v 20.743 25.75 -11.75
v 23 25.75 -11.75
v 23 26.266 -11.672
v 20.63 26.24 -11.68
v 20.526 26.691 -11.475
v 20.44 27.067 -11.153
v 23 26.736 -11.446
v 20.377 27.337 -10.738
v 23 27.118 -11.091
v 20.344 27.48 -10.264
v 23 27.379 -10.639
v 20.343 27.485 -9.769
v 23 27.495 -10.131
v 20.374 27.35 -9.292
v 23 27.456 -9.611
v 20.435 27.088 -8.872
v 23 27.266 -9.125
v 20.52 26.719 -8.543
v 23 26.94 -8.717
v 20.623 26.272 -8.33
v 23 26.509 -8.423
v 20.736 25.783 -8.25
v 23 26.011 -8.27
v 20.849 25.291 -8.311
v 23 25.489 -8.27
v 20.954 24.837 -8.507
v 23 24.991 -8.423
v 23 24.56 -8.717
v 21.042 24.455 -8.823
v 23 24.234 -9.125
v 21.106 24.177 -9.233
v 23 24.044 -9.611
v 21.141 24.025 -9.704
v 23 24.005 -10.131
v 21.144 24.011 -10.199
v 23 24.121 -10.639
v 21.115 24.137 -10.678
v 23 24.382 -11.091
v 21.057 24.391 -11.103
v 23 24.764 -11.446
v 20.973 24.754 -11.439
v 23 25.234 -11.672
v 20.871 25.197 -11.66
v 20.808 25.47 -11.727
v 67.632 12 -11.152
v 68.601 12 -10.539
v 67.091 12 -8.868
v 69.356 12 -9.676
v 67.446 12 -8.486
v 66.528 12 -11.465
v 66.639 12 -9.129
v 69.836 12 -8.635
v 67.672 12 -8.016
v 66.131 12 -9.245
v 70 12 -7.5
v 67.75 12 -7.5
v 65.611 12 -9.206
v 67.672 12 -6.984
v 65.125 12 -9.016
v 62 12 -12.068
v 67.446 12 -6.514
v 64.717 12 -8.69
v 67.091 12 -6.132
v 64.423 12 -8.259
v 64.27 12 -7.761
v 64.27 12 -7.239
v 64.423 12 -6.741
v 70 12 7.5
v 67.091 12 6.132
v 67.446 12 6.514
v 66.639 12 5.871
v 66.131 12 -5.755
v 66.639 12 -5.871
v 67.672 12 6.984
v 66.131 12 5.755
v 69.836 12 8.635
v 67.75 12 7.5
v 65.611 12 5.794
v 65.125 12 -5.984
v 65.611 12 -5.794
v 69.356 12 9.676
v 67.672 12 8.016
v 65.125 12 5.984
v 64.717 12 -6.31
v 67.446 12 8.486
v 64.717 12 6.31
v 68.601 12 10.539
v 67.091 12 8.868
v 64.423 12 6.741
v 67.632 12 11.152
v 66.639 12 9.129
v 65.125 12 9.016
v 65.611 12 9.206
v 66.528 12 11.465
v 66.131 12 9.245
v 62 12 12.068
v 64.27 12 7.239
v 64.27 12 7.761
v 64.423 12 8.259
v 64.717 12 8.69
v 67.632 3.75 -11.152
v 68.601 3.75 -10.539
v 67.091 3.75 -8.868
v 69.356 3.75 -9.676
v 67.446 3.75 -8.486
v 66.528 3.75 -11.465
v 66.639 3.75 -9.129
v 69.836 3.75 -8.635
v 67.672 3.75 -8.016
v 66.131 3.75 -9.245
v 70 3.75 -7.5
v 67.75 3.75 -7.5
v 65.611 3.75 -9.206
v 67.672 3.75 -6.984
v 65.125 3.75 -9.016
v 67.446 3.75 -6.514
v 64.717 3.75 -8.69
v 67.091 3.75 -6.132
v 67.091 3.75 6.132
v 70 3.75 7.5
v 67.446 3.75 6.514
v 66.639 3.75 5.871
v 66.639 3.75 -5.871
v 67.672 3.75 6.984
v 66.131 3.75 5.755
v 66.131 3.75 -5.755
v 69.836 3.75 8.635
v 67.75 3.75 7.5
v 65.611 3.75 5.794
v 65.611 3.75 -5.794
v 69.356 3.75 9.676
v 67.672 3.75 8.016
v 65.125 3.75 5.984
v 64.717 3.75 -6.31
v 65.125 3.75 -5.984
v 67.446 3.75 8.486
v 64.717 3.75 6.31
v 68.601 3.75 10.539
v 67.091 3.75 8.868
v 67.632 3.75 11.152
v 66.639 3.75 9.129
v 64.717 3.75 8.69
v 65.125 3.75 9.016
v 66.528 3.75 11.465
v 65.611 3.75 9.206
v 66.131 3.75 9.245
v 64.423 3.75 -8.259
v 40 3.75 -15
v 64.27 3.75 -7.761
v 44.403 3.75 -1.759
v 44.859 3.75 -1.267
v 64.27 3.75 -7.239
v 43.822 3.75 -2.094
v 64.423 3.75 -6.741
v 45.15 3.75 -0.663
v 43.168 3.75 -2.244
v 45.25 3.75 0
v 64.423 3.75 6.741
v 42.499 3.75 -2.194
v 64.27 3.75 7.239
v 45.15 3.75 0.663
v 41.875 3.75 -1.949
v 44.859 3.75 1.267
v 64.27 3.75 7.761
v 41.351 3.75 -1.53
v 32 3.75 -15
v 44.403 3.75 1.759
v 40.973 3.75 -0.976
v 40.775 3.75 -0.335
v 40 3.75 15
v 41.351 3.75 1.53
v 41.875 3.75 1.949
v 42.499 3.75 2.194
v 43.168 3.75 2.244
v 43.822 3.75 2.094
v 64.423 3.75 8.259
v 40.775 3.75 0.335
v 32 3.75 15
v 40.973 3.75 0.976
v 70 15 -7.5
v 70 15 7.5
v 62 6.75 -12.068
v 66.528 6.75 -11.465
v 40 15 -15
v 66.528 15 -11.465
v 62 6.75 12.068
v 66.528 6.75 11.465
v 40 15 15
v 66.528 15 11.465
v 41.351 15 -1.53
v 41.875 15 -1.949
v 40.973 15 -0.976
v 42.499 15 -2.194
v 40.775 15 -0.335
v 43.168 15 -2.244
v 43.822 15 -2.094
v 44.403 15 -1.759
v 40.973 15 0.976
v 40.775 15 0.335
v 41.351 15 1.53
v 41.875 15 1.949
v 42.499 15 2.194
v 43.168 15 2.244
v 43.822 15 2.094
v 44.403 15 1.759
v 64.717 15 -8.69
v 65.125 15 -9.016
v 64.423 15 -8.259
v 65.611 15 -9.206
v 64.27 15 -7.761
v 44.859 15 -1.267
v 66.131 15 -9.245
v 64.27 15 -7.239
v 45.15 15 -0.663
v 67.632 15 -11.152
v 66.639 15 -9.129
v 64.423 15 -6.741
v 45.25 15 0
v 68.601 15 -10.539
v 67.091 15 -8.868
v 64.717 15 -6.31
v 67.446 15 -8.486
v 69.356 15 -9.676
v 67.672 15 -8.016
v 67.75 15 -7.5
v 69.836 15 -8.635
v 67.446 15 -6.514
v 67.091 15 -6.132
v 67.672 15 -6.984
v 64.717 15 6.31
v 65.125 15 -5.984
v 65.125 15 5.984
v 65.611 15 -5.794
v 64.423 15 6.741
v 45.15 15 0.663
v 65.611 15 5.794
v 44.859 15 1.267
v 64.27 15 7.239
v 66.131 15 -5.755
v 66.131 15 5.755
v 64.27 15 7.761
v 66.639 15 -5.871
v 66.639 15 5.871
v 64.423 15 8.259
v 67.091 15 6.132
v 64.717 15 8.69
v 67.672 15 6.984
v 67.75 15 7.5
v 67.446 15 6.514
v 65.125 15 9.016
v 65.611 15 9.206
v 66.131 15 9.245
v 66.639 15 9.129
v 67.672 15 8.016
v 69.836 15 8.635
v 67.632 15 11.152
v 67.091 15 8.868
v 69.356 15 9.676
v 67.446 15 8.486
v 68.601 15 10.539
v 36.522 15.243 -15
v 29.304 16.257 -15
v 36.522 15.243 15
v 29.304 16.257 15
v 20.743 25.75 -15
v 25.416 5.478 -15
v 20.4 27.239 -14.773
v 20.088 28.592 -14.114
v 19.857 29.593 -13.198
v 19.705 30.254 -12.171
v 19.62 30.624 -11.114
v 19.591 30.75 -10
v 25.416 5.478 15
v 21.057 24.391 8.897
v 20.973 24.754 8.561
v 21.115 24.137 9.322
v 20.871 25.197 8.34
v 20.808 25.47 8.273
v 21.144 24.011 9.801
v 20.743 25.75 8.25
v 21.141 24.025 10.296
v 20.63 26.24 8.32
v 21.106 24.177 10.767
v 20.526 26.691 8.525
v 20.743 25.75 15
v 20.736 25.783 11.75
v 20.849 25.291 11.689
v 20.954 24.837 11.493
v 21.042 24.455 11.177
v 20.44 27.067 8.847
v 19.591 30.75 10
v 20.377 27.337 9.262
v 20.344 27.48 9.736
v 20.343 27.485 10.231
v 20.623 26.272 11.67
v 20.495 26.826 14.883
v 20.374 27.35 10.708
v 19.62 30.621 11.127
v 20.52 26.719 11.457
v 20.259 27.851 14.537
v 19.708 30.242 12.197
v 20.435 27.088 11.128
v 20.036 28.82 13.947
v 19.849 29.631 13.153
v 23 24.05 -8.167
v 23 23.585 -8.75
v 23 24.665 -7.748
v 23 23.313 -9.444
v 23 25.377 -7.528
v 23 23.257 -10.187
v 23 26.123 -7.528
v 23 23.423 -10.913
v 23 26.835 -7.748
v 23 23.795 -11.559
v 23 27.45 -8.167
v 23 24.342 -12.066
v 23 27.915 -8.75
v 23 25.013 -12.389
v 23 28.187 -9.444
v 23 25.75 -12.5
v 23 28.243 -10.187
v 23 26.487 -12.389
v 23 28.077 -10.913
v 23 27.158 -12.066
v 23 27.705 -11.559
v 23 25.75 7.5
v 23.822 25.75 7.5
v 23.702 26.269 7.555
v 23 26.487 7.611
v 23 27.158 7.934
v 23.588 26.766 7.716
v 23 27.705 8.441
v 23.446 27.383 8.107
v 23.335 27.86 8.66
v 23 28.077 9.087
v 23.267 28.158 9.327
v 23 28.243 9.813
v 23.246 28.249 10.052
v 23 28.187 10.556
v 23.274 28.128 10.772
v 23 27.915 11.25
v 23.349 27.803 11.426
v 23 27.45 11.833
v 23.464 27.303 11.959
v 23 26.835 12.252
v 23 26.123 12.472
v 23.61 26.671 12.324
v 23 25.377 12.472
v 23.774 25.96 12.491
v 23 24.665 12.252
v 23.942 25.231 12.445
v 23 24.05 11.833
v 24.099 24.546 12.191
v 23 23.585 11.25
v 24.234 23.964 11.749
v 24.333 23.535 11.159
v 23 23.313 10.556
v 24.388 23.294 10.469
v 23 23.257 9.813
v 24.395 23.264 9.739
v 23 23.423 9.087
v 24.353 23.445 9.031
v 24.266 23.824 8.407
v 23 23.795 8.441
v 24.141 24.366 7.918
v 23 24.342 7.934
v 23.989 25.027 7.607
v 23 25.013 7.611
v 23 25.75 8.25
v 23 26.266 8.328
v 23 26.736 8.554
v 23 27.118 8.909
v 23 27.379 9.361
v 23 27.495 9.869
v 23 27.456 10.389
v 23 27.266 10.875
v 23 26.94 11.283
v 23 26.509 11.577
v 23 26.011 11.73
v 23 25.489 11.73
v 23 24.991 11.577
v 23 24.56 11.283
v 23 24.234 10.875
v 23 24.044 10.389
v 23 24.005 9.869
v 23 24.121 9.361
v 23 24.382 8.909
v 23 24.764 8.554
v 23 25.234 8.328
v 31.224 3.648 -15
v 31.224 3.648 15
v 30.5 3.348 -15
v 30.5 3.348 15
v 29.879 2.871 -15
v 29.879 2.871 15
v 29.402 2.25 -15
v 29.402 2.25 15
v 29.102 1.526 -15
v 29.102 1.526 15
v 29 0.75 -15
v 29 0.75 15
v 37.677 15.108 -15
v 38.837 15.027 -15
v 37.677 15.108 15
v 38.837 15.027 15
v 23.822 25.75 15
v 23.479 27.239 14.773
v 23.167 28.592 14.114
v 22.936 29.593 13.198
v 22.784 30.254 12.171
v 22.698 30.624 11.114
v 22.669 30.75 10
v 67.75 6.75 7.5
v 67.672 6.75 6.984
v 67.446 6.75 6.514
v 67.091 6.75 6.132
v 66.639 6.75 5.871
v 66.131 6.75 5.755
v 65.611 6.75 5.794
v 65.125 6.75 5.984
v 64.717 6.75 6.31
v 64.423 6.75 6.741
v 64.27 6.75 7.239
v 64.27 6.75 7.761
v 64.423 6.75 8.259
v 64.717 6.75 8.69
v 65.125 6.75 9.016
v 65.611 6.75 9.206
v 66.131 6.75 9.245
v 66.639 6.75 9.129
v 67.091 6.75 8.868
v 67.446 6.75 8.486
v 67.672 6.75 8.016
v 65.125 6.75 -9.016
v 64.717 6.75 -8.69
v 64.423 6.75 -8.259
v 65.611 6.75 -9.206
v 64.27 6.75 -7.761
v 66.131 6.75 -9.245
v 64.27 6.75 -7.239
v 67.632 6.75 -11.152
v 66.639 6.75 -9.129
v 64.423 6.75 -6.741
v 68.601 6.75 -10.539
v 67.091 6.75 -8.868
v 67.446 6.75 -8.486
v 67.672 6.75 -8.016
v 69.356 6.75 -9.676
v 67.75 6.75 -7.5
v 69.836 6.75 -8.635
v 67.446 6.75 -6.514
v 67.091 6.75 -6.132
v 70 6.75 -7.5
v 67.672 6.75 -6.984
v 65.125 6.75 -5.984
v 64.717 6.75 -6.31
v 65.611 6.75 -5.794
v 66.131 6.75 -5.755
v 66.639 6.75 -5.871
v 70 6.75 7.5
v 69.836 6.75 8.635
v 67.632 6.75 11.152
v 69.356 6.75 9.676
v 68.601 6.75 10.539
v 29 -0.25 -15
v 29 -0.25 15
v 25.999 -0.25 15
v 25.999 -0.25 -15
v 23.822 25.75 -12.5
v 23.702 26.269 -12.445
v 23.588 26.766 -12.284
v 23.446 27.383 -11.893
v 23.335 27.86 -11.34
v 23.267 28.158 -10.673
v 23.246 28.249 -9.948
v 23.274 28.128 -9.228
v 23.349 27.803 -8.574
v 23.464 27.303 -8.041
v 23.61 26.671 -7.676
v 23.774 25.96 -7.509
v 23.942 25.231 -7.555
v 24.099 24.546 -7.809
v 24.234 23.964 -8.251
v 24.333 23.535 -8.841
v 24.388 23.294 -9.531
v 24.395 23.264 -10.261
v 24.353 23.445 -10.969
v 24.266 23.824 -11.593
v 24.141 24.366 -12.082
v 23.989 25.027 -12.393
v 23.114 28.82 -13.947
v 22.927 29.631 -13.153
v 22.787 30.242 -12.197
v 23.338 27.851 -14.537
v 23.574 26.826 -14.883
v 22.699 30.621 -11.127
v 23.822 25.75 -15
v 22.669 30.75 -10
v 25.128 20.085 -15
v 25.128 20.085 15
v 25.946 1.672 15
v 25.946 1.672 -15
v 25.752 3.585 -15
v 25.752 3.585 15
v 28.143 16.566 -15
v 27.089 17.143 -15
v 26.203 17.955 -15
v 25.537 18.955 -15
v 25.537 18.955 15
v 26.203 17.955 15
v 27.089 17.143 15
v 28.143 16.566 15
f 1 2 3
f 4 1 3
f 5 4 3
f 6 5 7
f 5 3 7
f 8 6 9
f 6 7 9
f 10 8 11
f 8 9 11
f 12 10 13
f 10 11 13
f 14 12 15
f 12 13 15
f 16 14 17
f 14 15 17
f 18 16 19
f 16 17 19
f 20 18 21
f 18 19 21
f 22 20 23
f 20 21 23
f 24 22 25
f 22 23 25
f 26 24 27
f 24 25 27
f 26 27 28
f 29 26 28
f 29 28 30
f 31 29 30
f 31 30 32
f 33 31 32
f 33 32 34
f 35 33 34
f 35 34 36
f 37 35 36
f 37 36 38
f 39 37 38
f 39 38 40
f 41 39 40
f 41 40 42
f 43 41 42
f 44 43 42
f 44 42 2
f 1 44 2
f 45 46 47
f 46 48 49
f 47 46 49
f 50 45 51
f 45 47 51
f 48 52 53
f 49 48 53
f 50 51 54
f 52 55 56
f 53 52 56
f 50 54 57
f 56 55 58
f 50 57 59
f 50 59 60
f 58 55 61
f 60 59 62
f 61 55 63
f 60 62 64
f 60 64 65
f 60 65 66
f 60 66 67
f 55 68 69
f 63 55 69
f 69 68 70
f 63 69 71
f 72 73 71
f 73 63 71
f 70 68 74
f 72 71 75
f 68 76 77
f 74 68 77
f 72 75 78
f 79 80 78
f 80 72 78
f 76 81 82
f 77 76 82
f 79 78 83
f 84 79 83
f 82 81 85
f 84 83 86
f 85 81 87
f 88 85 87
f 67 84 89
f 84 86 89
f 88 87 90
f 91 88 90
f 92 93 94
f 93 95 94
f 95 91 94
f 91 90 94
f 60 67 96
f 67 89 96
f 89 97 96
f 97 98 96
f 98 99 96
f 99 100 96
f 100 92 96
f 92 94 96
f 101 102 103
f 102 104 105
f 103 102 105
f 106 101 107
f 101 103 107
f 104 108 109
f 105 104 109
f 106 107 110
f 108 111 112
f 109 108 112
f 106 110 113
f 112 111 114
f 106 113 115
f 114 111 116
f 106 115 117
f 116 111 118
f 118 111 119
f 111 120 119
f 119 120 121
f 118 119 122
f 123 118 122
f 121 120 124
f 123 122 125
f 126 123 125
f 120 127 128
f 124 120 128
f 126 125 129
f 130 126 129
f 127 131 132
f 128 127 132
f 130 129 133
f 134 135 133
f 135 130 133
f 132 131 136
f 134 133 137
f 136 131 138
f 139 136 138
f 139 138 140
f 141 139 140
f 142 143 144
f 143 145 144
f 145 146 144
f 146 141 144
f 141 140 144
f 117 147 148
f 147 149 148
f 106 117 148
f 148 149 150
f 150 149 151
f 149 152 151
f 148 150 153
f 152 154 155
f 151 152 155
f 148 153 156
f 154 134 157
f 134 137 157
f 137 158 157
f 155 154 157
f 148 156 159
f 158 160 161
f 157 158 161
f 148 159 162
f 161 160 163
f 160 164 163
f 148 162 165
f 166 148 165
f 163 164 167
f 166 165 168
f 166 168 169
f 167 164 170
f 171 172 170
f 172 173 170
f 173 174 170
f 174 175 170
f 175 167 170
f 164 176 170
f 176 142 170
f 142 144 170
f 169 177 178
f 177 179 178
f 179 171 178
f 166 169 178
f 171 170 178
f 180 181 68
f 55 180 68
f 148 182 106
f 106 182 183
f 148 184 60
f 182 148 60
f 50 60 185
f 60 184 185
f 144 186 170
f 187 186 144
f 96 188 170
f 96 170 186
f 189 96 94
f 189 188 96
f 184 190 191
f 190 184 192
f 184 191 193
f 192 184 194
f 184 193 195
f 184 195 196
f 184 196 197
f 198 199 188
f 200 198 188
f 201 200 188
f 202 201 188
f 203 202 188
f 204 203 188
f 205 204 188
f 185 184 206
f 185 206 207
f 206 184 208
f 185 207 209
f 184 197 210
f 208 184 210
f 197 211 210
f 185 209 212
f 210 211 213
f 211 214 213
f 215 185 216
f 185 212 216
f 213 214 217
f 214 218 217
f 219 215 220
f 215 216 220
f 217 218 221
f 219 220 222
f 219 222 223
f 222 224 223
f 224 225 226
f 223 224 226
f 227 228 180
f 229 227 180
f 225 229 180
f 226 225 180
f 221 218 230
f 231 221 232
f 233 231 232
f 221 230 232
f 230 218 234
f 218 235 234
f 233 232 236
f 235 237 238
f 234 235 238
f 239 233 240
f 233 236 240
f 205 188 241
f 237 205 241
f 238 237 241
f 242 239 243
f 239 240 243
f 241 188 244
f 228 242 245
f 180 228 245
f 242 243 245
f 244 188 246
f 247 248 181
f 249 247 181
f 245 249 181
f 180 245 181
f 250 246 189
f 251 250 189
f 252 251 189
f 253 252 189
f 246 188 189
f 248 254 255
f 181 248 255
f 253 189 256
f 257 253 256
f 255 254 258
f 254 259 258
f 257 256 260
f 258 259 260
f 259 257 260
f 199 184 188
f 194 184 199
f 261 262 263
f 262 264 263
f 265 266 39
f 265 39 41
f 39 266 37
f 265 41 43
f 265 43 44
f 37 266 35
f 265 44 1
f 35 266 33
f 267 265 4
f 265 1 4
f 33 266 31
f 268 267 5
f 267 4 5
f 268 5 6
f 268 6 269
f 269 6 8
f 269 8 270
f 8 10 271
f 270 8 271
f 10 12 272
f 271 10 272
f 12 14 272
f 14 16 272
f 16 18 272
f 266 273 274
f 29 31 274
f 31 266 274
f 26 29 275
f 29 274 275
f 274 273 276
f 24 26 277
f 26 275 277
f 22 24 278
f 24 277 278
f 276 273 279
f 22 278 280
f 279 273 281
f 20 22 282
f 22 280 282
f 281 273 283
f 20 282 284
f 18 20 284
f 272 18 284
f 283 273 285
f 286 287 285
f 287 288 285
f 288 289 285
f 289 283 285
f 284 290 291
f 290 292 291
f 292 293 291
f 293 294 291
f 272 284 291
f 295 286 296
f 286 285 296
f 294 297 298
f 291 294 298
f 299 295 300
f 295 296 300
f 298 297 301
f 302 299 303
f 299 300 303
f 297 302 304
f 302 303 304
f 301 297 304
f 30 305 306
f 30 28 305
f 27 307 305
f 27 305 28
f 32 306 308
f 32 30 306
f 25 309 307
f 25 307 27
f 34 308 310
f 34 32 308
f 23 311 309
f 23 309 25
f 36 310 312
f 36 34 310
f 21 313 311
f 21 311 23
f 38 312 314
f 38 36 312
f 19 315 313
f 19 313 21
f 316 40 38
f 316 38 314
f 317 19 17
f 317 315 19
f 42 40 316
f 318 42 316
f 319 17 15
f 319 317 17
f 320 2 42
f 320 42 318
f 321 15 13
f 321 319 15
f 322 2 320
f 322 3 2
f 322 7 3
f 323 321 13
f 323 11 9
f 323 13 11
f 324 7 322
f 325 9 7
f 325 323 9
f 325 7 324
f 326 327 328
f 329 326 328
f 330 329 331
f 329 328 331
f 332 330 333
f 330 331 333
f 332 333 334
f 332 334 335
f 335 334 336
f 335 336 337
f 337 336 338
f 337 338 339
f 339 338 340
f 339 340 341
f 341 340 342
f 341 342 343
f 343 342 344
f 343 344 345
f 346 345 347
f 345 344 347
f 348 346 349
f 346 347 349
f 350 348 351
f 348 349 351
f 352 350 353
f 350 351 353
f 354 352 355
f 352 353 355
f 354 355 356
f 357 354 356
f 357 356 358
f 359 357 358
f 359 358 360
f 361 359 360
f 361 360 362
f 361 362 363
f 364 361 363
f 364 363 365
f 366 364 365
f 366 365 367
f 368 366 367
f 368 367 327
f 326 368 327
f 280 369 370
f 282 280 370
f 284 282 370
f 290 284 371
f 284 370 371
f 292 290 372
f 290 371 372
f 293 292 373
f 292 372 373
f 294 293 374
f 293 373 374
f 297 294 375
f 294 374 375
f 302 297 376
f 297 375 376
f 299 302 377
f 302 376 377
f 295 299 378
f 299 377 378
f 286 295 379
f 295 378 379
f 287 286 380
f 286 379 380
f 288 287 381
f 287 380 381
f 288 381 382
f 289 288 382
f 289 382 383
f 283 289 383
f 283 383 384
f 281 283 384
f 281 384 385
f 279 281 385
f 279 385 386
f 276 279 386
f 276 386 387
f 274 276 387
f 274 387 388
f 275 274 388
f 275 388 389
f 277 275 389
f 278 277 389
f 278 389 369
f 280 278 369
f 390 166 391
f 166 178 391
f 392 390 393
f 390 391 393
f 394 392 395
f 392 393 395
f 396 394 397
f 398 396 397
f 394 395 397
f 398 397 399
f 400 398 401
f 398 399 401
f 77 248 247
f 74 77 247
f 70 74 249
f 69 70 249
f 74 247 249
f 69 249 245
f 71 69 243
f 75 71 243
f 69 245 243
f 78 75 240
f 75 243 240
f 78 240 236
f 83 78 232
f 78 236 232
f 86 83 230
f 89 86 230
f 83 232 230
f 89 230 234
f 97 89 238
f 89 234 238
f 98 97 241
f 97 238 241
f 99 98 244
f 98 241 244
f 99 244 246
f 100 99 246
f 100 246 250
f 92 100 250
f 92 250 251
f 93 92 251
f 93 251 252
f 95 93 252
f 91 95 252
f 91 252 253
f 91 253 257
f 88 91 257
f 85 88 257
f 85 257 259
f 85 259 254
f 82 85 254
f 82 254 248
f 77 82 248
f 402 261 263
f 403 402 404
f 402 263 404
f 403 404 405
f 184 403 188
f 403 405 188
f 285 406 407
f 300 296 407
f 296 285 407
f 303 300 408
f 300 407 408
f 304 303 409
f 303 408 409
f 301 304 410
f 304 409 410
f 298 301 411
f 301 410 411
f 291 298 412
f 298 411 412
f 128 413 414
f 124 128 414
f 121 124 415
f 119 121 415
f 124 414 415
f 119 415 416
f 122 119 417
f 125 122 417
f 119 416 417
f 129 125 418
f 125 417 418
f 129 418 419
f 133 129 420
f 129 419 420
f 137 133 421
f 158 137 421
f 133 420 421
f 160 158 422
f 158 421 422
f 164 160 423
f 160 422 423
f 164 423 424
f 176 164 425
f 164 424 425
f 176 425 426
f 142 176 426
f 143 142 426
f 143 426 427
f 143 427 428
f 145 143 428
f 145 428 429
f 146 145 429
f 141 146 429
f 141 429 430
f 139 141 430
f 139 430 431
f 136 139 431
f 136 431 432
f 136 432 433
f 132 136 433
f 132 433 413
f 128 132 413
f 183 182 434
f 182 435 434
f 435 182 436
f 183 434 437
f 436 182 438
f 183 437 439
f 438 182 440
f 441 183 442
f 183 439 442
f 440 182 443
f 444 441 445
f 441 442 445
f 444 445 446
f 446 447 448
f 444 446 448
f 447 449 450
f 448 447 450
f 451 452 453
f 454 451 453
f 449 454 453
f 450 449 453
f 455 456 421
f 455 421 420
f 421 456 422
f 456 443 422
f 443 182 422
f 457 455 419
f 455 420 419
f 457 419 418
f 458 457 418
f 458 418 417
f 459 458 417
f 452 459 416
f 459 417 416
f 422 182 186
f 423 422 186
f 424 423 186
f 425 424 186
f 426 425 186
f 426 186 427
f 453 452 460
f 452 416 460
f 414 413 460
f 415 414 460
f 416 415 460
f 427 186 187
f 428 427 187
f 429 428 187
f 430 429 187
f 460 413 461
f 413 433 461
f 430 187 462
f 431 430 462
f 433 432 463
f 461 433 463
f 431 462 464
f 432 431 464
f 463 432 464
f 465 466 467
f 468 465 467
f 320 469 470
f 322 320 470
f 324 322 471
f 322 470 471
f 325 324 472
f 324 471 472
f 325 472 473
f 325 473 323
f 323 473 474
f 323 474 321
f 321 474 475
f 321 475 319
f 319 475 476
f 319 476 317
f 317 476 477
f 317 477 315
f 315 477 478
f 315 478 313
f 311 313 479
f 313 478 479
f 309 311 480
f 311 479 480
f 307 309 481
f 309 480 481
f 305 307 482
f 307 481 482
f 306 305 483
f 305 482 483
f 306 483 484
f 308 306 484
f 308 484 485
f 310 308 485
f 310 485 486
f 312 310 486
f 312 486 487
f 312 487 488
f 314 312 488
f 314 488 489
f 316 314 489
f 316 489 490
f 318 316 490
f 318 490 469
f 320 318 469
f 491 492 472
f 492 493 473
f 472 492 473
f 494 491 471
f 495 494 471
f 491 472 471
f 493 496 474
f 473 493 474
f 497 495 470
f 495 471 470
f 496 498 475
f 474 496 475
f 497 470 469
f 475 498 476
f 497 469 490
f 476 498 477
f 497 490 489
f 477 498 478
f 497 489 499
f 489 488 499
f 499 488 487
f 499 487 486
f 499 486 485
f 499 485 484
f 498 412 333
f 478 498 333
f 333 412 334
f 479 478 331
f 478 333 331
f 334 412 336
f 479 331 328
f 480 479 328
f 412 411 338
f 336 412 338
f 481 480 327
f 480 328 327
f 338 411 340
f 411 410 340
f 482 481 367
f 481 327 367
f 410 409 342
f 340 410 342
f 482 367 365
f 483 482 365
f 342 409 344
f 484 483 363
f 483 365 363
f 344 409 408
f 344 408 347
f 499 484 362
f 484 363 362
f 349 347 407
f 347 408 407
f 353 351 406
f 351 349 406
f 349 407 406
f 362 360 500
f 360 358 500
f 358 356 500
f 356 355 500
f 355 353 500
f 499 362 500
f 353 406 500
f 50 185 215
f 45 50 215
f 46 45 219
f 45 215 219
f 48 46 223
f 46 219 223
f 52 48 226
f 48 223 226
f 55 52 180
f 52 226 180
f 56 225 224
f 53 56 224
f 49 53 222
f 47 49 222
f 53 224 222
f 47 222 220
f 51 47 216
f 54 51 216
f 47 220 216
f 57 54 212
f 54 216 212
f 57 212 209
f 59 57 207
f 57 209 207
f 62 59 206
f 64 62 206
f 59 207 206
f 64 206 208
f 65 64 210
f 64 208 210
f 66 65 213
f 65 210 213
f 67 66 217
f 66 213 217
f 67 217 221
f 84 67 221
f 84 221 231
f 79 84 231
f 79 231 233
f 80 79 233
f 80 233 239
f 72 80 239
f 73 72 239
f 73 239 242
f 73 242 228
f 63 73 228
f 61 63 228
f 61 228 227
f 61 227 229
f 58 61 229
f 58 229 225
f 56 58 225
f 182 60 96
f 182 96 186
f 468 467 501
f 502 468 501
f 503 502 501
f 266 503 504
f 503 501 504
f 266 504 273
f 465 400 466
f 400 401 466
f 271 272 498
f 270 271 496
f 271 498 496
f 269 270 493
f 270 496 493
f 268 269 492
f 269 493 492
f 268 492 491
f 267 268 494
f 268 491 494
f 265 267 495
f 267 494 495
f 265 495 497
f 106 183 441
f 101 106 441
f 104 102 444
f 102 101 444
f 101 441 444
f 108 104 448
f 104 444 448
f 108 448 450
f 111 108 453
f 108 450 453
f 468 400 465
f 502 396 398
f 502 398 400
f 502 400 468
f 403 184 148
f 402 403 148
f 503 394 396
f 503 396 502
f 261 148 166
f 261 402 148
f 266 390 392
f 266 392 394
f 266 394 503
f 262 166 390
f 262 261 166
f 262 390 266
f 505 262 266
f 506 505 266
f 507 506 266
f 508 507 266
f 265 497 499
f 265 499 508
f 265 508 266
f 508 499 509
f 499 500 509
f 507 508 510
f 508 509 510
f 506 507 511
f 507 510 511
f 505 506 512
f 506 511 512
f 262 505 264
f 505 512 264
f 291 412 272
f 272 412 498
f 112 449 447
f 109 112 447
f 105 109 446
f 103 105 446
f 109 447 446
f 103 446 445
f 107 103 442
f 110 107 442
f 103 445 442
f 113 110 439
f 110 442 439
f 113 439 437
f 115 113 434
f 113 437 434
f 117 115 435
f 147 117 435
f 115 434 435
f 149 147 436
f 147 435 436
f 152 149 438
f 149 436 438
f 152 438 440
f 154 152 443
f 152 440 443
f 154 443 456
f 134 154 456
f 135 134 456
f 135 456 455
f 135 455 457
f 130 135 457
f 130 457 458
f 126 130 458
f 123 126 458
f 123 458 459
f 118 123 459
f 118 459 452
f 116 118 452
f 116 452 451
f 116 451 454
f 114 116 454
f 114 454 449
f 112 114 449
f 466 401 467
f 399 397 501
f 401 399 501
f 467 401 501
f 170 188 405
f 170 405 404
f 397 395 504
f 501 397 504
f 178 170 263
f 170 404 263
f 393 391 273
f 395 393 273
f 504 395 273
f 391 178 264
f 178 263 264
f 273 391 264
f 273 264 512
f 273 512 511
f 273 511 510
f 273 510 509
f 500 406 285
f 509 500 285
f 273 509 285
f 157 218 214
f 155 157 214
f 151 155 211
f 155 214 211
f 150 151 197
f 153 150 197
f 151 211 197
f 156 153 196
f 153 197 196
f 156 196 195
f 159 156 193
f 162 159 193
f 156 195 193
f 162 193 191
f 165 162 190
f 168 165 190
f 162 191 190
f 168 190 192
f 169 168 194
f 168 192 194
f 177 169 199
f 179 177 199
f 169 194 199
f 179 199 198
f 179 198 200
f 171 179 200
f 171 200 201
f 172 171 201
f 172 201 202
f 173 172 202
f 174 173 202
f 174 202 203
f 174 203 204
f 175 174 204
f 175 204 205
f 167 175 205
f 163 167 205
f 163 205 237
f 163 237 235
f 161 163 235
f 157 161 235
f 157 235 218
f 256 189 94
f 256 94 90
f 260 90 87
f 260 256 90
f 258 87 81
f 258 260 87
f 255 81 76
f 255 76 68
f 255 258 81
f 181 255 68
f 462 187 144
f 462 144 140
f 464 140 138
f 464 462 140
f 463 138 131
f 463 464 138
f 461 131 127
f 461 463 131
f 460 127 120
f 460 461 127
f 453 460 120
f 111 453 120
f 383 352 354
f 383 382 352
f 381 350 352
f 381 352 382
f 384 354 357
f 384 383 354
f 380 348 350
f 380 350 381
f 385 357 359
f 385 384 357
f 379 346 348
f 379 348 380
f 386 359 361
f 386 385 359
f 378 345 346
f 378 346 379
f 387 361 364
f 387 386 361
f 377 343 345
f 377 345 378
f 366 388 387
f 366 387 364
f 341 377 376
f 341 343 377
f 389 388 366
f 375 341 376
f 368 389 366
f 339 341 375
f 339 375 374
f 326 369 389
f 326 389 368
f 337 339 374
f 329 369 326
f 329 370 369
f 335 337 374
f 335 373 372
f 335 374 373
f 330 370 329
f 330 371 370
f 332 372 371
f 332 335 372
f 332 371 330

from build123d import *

# Parameters (mm, degrees)
BOSS_EXTRUDE1_DEPTH = 15
SKETCH2_R           = 1.75
SKETCH2_R_2         = 2.25
CUT_EXTRUDE1_DEPTH  = 16.25
SKETCH6_R           = 1.75
CUT_EXTRUDE4_DEPTH  = 51.639881715
SKETCH8_R           = 2.5
CUT_EXTRUDE5_DEPTH  = 2


with BuildPart() as part:
    # Sketch1 → Boss-Extrude1 (new body, symmetric)
    with BuildSketch(Plane.XY):
        with BuildLine():
            Line((25.416367975, 5.477977632), (19.360118285, 31.75))
            Line((19.360118285, 31.75), (22.438796391, 31.75))
            Line((22.438796391, 31.75), (25.127779039, 20.085188295))
            ThreePointArc((25.127779039, 20.085188295), (26.621571391, 17.522387939), (29.304484295, 16.256947461))
            Line((29.304484295, 16.256947461), (36.522421475, 15.243052539))
            ThreePointArc((36.522421475, 15.243052539), (38.256969096, 15.060837158), (40, 15))
            Line((40, 15), (70, 15))
            Line((70, 15), (70, 12))
            Line((70, 12), (62, 12))
            Line((62, 12), (62, 6.75))
            Line((62, 6.75), (70, 6.75))
            Line((70, 6.75), (70, 3.75))
            Line((70, 3.75), (32, 3.75))
            ThreePointArc((32, 3.75), (29.878679656, 2.871320344), (29, 0.75))
            Line((29, 0.75), (29, -0.25))
            Line((29, -0.25), (25.998798049, -0.25))
            ThreePointArc((25.998798049, -0.25), (25.866624369, 2.6301604), (25.416367975, 5.477977632))
        make_face()
    extrude(amount=BOSS_EXTRUDE1_DEPTH, both=True)

    # Sketch2 → Cut-Extrude1 (cut, through all)
    with BuildSketch(Plane(origin=(0, 15, 0), x_dir=(1, 0, 0), z_dir=(0, 1, 0))):
        with Locations((66, 7.5)):
            Circle(SKETCH2_R)
        with Locations((43, 0)):
            Circle(SKETCH2_R_2)
        with Locations((66, -7.5)):
            Circle(SKETCH2_R)
        with BuildLine():
            Line((70, 7.5), (70, 15))
            Line((70, 15), (40, 15))
            Line((40, 15), (66.528351549, 11.464952035))
            ThreePointArc((66.528351549, 11.464952035), (69.009435678, 10.135013644), (70, 7.5))
        make_face()
        with BuildLine():
            Line((40, -15), (66.528351549, -11.464952035))
            ThreePointArc((66.528351549, -11.464952035), (69.009435678, -10.135013644), (70, -7.5))
            Line((70, -7.5), (70, -15))
            Line((70, -15), (40, -15))
        make_face()
    extrude(amount=-CUT_EXTRUDE1_DEPTH, mode=Mode.SUBTRACT)

    # Sketch6 → Cut-Extrude4 (cut, through all)
    with BuildSketch(Plane(origin=(70, 0, 0), x_dir=(0, 0, -1), z_dir=(1, 0, 0))):
        with Locations((-10, 25.75)):
            Circle(SKETCH6_R)
        with Locations((10, 25.75)):
            Circle(SKETCH6_R)
        with BuildLine():
            Line((-10, 30.75), (10, 30.75))
            ThreePointArc((10, 30.75), (13.535533906, 29.285533906), (15, 25.75))
            Line((15, 25.75), (15, 31.75))
            Line((15, 31.75), (-15, 31.75))
            Line((-15, 31.75), (-15, 25.75))
            ThreePointArc((-15, 25.75), (-13.535533906, 29.285533906), (-10, 30.75))
        make_face()
    extrude(amount=-CUT_EXTRUDE4_DEPTH, mode=Mode.SUBTRACT)

    # Sketch8 → Cut-Extrude5 (cut)
    with BuildSketch(Plane(origin=(25, 0, 0), x_dir=(0, 0, -1), z_dir=(1, 0, 0))):
        with Locations((-10, 25.75)):
            Circle(SKETCH8_R)
        with Locations((10, 25.75)):
            Circle(SKETCH8_R)
    extrude(amount=-CUT_EXTRUDE5_DEPTH, mode=Mode.SUBTRACT)


solid = part.part
